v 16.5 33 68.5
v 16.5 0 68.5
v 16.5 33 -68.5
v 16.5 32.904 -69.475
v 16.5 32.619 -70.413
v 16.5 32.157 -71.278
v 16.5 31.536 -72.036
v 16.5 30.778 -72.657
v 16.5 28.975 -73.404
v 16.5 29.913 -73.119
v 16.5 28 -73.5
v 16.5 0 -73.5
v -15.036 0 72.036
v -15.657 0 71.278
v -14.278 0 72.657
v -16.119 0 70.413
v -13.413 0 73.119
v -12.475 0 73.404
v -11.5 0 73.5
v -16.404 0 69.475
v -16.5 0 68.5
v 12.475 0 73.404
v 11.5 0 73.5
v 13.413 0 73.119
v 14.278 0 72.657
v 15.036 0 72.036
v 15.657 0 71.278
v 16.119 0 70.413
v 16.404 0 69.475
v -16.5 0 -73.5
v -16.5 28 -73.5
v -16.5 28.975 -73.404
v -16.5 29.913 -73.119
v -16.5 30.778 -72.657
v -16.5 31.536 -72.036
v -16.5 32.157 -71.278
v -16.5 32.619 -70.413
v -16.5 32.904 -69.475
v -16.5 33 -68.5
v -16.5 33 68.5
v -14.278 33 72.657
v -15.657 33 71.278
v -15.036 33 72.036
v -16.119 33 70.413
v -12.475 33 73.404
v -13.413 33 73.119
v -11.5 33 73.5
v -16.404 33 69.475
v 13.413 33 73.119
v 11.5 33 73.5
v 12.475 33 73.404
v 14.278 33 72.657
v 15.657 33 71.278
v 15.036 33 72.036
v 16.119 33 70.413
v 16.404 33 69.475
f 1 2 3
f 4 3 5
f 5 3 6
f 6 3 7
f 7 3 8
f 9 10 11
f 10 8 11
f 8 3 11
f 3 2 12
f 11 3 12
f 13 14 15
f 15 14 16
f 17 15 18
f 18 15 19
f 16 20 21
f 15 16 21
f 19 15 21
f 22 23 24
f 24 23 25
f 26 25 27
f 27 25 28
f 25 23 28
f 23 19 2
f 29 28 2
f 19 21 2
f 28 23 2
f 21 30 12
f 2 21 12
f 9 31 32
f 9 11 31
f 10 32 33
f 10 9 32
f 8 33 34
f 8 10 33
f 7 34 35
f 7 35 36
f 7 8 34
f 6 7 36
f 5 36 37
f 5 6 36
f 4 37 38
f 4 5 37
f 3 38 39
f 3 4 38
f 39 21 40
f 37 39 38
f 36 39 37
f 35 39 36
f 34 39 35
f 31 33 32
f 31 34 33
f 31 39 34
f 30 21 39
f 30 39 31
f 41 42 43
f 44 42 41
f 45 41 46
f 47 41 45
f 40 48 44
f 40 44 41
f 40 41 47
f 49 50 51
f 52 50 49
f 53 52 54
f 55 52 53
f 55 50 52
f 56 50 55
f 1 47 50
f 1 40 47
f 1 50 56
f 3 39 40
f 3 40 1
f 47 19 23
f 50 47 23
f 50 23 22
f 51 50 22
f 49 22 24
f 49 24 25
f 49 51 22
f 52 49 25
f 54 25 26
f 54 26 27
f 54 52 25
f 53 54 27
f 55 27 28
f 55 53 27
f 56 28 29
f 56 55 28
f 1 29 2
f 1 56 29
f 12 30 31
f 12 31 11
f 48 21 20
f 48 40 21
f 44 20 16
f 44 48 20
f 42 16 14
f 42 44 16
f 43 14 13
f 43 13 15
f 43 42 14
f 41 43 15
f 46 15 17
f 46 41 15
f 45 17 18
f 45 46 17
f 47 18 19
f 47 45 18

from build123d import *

# Parameters (mm, degrees)
SKETCH1_W           = 33
SKETCH1_H           = 147
BOSS_EXTRUDE1_DEPTH = 33
FILLET1_R           = 5


with BuildPart() as part:
    # Sketch1 → Boss-Extrude1 (new body)
    with BuildSketch(Plane(origin=(0, 0, 0), x_dir=(1, 0, 0), z_dir=(0, 1, 0))):
        Rectangle(SKETCH1_W, SKETCH1_H)
    extrude(amount=BOSS_EXTRUDE1_DEPTH)

    # Fillet1
    fillet1_edges = [part.edges().sort_by_distance(p)[0] for p in [
        (0, 33, -73.5),
        (16.5, 16.5, 73.5),
        (-16.5, 16.5, 73.5),
    ]]
    fillet(fillet1_edges, radius=FILLET1_R)


solid = part.part
